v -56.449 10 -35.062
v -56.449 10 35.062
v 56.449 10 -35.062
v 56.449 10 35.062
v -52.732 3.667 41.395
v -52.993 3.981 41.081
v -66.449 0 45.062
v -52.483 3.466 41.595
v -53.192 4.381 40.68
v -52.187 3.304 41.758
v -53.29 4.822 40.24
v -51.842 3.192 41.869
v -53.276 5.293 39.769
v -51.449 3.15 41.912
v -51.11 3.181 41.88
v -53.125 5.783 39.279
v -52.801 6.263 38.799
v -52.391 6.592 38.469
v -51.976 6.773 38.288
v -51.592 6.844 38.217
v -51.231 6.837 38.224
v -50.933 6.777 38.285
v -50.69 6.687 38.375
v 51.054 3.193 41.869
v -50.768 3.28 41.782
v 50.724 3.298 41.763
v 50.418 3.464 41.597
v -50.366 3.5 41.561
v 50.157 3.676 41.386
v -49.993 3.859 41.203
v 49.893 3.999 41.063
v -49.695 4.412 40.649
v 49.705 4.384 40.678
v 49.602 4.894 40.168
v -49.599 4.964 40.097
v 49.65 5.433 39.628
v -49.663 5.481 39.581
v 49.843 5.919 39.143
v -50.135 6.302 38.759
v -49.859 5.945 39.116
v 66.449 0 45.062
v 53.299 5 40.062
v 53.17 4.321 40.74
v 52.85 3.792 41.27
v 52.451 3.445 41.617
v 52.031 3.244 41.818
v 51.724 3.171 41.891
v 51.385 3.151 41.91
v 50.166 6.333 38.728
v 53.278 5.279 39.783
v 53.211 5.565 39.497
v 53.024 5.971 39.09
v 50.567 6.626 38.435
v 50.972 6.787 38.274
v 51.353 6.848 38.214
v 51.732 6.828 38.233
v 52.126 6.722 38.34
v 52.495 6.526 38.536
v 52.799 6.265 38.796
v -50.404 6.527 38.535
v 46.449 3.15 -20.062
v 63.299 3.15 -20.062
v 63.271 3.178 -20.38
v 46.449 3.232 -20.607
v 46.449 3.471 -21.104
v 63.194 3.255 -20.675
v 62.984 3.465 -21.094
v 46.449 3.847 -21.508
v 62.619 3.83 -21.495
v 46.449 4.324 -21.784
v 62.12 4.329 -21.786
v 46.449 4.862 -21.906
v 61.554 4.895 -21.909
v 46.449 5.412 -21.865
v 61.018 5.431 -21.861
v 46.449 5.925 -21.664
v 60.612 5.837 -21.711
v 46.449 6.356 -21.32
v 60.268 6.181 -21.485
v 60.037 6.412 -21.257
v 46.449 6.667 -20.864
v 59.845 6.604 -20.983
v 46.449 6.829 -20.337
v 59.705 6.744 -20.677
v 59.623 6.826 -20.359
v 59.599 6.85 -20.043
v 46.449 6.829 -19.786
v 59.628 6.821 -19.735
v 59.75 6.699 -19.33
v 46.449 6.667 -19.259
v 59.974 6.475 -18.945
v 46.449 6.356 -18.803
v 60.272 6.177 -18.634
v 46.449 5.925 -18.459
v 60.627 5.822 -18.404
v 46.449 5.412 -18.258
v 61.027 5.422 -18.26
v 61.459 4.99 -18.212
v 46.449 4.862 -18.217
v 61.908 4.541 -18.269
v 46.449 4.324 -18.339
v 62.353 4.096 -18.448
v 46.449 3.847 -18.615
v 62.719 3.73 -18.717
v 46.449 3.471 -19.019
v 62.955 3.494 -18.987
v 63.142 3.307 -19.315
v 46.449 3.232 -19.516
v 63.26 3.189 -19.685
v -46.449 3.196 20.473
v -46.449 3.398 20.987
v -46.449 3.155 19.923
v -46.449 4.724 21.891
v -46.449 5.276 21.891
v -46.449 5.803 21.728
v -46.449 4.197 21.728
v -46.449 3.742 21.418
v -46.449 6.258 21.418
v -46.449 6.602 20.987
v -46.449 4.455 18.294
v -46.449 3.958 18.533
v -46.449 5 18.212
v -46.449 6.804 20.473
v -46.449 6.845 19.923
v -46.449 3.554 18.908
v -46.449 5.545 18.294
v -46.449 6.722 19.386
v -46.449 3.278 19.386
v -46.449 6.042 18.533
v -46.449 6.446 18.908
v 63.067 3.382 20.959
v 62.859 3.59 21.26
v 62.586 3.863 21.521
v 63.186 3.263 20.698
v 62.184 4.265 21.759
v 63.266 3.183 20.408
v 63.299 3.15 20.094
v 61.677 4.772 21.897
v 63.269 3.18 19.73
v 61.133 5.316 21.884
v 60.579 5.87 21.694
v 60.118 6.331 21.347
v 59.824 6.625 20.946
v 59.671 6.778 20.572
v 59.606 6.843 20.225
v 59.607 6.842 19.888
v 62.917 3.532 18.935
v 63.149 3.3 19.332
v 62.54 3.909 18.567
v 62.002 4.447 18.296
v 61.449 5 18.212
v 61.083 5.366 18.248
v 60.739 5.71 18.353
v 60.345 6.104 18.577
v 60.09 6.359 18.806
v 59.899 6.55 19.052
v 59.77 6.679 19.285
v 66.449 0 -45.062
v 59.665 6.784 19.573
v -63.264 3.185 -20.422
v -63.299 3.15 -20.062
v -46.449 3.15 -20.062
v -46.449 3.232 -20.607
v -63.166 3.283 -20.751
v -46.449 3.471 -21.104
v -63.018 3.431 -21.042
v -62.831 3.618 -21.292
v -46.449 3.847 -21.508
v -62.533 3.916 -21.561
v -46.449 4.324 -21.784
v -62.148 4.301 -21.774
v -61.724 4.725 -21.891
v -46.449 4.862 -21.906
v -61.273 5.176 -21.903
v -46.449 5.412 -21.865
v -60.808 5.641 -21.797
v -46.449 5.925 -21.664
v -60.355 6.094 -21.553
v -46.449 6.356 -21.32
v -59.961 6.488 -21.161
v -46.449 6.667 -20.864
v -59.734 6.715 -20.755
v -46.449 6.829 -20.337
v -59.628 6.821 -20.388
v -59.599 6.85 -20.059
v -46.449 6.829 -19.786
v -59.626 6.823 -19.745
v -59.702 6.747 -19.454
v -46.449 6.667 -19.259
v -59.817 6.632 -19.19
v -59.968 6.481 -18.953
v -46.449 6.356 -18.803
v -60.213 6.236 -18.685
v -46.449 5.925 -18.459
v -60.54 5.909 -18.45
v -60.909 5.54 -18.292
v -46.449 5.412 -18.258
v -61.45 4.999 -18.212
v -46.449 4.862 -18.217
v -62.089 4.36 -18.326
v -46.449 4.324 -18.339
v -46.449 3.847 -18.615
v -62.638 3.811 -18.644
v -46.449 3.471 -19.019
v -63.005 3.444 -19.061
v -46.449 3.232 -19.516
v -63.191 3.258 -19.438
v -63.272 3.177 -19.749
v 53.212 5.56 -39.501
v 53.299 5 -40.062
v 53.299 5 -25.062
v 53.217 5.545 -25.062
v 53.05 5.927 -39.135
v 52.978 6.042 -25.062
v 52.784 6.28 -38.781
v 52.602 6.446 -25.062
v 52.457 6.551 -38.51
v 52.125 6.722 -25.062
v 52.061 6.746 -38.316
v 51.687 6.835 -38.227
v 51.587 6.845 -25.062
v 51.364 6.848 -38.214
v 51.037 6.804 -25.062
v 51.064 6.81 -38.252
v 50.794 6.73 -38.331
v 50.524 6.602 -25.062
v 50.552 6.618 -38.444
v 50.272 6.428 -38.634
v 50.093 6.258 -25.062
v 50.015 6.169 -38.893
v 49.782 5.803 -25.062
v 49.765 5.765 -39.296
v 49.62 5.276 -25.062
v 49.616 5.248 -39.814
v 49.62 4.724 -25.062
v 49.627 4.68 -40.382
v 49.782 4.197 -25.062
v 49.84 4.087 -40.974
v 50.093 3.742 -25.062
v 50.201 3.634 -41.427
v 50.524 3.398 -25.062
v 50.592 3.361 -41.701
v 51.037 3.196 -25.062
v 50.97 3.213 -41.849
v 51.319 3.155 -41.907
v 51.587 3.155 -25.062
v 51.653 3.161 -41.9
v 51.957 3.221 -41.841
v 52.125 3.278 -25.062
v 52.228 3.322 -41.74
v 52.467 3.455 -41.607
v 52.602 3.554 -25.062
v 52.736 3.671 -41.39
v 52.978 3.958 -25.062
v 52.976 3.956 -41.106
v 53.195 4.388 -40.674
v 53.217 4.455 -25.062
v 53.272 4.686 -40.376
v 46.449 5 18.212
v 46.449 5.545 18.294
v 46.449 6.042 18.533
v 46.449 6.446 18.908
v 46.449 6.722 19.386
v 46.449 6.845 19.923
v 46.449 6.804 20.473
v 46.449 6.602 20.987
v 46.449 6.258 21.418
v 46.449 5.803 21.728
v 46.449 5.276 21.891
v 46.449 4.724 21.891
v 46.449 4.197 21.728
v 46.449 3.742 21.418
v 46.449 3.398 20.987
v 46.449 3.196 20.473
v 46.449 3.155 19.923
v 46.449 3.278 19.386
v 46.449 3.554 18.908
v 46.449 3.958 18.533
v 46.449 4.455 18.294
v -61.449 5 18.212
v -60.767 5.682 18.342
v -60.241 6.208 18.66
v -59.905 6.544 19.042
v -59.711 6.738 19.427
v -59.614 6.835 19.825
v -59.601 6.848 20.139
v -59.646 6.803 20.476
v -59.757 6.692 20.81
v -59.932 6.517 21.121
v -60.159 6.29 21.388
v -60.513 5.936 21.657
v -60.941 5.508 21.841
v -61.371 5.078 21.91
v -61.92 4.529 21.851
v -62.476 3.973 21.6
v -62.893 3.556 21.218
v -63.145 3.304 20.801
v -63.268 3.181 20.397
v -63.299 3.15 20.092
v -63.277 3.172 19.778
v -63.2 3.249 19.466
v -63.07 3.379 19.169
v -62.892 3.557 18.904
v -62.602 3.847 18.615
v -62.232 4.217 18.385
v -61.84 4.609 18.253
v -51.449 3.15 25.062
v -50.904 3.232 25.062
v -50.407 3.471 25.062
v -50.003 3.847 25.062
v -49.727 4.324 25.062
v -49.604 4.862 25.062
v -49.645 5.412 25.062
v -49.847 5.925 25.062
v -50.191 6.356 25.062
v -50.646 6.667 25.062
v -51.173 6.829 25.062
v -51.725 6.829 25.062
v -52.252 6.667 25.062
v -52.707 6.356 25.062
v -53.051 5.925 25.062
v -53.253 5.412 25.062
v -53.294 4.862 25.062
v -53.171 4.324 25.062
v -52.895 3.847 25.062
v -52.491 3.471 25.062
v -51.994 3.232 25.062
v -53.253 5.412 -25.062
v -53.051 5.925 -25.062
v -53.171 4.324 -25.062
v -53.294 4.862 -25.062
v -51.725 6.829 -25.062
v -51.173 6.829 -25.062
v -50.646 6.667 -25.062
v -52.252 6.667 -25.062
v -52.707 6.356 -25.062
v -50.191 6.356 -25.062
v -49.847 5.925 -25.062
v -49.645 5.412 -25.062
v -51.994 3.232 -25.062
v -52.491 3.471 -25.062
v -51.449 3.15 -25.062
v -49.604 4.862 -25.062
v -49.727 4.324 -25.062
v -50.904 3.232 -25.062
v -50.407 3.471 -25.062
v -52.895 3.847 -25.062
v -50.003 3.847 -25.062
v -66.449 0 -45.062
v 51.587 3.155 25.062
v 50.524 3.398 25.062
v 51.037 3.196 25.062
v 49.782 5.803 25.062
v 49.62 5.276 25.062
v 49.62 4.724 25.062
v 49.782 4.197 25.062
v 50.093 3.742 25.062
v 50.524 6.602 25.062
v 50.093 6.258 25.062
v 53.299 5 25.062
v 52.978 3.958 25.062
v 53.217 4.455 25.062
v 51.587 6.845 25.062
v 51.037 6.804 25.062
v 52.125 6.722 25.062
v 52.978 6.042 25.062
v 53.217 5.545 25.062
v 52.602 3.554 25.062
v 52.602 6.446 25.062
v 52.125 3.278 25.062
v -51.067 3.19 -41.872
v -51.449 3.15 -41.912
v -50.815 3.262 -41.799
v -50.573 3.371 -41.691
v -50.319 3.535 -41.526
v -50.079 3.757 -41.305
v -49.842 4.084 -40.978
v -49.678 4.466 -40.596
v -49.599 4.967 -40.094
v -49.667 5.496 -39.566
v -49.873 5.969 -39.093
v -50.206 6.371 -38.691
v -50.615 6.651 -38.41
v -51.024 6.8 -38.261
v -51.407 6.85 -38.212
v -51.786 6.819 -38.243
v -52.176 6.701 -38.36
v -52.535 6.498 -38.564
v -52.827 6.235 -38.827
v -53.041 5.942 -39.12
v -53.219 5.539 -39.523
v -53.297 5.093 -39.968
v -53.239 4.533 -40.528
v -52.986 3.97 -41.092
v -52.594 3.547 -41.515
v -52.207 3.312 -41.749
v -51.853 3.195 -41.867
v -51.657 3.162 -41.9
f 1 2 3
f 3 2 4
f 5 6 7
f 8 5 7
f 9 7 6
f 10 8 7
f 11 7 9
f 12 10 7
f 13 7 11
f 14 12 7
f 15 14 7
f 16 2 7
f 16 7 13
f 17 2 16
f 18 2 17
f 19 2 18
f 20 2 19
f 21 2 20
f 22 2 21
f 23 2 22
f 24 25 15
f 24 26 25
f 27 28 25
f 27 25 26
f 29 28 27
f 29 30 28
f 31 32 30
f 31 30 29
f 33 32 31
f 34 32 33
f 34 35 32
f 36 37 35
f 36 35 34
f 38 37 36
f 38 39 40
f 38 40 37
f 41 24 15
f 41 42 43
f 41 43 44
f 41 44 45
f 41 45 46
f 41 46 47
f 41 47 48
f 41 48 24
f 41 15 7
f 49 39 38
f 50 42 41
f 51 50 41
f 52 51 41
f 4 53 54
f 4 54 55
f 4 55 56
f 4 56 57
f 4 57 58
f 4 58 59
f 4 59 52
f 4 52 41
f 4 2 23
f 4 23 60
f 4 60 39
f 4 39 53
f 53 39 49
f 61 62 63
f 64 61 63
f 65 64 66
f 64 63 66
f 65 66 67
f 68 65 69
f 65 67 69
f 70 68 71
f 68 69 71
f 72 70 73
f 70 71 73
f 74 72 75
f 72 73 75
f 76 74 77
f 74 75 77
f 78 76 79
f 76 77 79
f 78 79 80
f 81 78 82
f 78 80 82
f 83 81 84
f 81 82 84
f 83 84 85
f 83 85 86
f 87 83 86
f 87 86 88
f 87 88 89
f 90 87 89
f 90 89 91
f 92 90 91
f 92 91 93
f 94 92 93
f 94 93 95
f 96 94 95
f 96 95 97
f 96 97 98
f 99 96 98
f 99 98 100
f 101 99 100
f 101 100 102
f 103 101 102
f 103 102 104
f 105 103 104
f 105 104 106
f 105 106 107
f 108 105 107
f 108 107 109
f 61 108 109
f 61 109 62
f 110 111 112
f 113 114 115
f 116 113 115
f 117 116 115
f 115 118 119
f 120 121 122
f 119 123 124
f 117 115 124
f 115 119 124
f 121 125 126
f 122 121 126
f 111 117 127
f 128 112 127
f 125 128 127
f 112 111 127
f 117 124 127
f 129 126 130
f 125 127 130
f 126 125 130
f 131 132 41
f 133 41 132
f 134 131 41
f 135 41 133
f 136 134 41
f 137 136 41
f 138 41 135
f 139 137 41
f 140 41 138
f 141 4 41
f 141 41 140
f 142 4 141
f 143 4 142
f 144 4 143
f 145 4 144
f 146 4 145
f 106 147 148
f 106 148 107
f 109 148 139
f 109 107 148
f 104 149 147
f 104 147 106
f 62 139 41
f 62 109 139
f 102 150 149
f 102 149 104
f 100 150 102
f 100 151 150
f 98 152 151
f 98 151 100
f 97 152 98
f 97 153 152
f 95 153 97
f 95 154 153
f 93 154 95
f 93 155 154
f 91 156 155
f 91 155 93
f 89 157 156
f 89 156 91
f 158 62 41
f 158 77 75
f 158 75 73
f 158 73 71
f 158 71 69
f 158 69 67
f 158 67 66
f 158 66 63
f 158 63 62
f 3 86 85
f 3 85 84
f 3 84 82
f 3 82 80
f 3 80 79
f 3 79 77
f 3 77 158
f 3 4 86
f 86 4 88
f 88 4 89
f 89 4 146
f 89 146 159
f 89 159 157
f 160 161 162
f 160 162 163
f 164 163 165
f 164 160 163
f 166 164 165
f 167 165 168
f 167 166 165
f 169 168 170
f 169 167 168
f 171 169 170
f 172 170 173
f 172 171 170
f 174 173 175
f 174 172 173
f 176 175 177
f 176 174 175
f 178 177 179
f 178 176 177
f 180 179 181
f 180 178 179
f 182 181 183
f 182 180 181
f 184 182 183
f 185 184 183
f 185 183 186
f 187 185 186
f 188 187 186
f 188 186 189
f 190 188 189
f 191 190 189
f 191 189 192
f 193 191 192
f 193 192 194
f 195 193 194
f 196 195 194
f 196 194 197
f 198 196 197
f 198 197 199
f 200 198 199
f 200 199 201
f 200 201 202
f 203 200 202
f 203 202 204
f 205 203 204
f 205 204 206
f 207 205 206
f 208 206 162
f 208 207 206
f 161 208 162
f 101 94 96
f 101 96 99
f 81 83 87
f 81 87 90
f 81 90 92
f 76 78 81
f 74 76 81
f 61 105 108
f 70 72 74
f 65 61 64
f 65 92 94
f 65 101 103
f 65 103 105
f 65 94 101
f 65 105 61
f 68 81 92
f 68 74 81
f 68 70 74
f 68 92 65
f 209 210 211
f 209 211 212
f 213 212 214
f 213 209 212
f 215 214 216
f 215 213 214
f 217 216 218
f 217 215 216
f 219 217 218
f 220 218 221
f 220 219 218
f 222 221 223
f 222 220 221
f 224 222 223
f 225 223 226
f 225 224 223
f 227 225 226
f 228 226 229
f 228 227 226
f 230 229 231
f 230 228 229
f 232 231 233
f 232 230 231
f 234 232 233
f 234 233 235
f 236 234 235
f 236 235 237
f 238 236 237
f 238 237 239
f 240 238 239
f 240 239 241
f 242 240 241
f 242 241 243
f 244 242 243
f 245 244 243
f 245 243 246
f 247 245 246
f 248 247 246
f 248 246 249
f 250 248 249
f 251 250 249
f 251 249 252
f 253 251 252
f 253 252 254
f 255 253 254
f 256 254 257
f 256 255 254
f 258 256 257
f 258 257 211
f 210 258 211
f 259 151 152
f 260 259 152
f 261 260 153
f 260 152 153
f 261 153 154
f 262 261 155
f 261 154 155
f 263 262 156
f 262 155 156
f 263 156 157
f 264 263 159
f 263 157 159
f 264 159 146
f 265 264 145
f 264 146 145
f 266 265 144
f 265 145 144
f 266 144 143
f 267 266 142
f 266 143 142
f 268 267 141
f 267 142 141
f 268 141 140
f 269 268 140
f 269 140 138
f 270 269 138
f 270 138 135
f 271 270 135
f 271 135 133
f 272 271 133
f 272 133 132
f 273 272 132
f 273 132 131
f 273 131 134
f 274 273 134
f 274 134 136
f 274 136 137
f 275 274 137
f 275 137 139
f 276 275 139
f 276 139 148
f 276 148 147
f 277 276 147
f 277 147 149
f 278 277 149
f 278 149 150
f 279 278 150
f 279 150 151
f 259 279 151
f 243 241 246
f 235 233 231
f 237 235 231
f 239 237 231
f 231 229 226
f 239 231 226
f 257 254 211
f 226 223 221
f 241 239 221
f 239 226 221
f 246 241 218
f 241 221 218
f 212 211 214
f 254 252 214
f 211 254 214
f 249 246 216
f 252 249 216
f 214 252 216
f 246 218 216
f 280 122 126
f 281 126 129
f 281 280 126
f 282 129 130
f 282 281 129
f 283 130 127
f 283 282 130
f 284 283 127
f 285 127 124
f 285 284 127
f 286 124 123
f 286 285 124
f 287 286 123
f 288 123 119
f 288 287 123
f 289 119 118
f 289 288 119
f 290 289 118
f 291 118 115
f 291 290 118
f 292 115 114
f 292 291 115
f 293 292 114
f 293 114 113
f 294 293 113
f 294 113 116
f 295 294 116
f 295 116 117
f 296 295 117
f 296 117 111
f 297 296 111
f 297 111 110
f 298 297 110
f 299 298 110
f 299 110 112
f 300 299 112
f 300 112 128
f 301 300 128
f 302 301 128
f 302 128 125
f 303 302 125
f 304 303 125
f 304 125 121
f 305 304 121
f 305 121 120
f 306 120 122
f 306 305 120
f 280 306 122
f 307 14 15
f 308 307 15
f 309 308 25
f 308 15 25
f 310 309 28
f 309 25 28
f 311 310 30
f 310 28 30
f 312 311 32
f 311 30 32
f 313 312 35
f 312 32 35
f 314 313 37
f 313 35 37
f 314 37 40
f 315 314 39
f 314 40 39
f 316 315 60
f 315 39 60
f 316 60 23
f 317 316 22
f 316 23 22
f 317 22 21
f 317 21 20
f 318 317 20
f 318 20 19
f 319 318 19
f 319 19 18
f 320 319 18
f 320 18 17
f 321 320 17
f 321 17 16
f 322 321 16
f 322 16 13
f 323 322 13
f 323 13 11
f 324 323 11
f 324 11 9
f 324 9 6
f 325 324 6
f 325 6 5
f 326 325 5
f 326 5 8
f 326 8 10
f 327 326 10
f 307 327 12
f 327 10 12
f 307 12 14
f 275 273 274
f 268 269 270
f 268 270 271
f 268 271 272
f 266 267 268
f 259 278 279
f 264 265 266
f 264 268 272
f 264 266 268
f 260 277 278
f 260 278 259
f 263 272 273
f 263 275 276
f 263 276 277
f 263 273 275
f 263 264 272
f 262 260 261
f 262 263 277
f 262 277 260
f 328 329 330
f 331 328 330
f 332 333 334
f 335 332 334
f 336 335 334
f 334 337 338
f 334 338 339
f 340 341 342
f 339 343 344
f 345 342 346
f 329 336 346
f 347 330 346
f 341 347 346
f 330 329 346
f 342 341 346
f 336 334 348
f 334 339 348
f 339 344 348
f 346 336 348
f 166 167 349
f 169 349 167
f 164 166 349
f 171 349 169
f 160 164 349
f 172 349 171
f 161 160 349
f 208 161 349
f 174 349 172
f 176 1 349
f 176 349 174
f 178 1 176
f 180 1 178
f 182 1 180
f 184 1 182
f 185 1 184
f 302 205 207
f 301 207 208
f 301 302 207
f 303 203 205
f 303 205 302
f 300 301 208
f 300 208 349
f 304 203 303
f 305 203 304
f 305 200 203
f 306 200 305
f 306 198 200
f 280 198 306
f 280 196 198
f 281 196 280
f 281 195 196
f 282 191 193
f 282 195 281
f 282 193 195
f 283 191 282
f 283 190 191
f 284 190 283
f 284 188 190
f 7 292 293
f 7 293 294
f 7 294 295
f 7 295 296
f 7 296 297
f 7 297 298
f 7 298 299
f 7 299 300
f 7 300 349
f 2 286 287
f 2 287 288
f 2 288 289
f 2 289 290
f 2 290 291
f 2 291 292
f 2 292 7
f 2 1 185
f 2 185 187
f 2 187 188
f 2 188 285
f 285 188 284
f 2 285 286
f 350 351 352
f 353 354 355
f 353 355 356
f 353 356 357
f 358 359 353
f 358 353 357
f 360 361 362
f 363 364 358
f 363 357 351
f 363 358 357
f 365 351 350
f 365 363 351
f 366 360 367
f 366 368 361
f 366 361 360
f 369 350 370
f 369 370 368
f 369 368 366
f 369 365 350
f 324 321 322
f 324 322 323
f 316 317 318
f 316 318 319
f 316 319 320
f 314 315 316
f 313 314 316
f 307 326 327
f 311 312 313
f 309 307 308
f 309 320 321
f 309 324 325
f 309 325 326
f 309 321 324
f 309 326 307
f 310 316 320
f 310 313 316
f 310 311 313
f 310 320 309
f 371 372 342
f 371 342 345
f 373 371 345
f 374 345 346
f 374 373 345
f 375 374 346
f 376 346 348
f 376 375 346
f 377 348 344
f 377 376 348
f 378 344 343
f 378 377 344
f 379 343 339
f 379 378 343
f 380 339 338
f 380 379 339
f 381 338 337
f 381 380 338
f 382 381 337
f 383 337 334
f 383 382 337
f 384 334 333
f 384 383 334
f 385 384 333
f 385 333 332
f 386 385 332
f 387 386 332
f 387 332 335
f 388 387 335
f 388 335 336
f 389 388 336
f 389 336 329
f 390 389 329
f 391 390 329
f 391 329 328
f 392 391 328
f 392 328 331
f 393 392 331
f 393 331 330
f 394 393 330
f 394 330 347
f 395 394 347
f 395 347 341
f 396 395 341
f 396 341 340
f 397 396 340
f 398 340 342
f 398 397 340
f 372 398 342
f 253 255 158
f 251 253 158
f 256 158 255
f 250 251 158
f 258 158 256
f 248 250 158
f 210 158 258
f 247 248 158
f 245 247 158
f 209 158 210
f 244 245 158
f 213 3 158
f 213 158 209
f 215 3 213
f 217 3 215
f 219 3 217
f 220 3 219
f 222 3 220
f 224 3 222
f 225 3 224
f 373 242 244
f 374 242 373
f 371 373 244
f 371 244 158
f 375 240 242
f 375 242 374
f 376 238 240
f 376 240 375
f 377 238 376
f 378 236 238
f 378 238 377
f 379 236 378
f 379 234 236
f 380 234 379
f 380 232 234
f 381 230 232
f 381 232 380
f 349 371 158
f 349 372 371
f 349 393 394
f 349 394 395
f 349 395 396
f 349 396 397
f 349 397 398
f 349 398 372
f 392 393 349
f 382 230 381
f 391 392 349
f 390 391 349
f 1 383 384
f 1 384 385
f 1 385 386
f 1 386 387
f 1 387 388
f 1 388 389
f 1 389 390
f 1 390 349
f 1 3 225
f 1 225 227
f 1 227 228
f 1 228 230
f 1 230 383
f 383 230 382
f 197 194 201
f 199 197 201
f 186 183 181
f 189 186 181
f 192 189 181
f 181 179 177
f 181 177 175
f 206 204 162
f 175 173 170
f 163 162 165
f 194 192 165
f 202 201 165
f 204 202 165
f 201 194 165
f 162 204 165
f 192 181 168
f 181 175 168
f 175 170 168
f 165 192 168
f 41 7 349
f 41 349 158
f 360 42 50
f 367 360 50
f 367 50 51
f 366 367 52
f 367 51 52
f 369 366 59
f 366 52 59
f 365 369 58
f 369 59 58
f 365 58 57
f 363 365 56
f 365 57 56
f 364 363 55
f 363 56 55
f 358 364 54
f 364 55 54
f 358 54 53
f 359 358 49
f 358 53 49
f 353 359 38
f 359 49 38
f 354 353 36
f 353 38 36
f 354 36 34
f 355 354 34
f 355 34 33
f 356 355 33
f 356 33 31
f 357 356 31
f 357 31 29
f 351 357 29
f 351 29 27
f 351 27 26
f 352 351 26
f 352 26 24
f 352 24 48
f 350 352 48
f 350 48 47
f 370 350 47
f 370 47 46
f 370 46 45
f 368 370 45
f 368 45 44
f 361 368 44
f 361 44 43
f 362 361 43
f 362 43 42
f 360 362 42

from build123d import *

# Parameters (mm, degrees)
SKETCH_3_R          = 1.85
CUT_EXTRUDE_1_DEPTH = 20
SKETCH_4_R          = 1.85
CUT_EXTRUDE_2_DEPTH = 20


with BuildPart() as part:
    # Эскиз1 → По сечениям1 section 0
    with BuildSketch(Plane(origin=(0, 0, 0), x_dir=(1, 0, 0), z_dir=(0, 1, 0))):
        with BuildLine():
            Line((-66.449008168, -45.061574365), (66.449008168, -45.061574365))
            Line((66.449008168, -45.061574365), (66.449008168, 45.061574365))
            Line((66.449008168, 45.061574365), (-66.449008168, 45.061574365))
            Line((-66.449008168, 45.061574365), (-66.449008168, -45.061574365))
        make_face()
    # Эскиз2 → По сечениям1 section 1
    with BuildSketch(Plane(origin=(0, 10, 0), x_dir=(1, 0, 0), z_dir=(0, 1, 0))):
        with BuildLine():
            Line((56.449008168, 35.061574365), (-56.449008168, 35.061574365))
            Line((-56.449008168, 35.061574365), (-56.449008168, -35.061574365))
            Line((-56.449008168, -35.061574365), (56.449008168, -35.061574365))
            Line((56.449008168, -35.061574365), (56.449008168, 35.061574365))
        make_face()
    loft()

    # Эскиз3 → Вырез-Вытянуть1 (cut)
    with BuildSketch(Plane.XY.offset(45.061574365)):
        with Locations((51.449008168, 5)):
            Circle(SKETCH_3_R)
        with Locations(Location((-51.449008168, 5, 0), (0, 0, 270))):
            Circle(SKETCH_3_R)
    cut_extrude_1 = extrude(amount=-CUT_EXTRUDE_1_DEPTH, mode=Mode.SUBTRACT)

    # Зеркальное отражение1: Вырез-Вытянуть1 across plane
    add(cut_extrude_1.mirror(Plane.XY), mode=Mode.SUBTRACT)

    # Эскиз4 → Вырез-Вытянуть2 (cut)
    with BuildSketch(Plane(origin=(66.449008168, 0, 0), x_dir=(0, 0, -1), z_dir=(1, 0, 0))):
        with Locations((-20.061574365, 5)):
            Circle(SKETCH_4_R)
        with Locations(Location((20.061574365, 5, 0), (0, 0, 270))):
            Circle(SKETCH_4_R)
    cut_extrude_2 = extrude(amount=-CUT_EXTRUDE_2_DEPTH, mode=Mode.SUBTRACT)

    # Зеркальное отражение2: Вырез-Вытянуть2 across plane
    add(cut_extrude_2.mirror(Plane(origin=(0, 0, 0), x_dir=(0, 0, 1), z_dir=(1, 0, 0))), mode=Mode.SUBTRACT)


solid = part.part
